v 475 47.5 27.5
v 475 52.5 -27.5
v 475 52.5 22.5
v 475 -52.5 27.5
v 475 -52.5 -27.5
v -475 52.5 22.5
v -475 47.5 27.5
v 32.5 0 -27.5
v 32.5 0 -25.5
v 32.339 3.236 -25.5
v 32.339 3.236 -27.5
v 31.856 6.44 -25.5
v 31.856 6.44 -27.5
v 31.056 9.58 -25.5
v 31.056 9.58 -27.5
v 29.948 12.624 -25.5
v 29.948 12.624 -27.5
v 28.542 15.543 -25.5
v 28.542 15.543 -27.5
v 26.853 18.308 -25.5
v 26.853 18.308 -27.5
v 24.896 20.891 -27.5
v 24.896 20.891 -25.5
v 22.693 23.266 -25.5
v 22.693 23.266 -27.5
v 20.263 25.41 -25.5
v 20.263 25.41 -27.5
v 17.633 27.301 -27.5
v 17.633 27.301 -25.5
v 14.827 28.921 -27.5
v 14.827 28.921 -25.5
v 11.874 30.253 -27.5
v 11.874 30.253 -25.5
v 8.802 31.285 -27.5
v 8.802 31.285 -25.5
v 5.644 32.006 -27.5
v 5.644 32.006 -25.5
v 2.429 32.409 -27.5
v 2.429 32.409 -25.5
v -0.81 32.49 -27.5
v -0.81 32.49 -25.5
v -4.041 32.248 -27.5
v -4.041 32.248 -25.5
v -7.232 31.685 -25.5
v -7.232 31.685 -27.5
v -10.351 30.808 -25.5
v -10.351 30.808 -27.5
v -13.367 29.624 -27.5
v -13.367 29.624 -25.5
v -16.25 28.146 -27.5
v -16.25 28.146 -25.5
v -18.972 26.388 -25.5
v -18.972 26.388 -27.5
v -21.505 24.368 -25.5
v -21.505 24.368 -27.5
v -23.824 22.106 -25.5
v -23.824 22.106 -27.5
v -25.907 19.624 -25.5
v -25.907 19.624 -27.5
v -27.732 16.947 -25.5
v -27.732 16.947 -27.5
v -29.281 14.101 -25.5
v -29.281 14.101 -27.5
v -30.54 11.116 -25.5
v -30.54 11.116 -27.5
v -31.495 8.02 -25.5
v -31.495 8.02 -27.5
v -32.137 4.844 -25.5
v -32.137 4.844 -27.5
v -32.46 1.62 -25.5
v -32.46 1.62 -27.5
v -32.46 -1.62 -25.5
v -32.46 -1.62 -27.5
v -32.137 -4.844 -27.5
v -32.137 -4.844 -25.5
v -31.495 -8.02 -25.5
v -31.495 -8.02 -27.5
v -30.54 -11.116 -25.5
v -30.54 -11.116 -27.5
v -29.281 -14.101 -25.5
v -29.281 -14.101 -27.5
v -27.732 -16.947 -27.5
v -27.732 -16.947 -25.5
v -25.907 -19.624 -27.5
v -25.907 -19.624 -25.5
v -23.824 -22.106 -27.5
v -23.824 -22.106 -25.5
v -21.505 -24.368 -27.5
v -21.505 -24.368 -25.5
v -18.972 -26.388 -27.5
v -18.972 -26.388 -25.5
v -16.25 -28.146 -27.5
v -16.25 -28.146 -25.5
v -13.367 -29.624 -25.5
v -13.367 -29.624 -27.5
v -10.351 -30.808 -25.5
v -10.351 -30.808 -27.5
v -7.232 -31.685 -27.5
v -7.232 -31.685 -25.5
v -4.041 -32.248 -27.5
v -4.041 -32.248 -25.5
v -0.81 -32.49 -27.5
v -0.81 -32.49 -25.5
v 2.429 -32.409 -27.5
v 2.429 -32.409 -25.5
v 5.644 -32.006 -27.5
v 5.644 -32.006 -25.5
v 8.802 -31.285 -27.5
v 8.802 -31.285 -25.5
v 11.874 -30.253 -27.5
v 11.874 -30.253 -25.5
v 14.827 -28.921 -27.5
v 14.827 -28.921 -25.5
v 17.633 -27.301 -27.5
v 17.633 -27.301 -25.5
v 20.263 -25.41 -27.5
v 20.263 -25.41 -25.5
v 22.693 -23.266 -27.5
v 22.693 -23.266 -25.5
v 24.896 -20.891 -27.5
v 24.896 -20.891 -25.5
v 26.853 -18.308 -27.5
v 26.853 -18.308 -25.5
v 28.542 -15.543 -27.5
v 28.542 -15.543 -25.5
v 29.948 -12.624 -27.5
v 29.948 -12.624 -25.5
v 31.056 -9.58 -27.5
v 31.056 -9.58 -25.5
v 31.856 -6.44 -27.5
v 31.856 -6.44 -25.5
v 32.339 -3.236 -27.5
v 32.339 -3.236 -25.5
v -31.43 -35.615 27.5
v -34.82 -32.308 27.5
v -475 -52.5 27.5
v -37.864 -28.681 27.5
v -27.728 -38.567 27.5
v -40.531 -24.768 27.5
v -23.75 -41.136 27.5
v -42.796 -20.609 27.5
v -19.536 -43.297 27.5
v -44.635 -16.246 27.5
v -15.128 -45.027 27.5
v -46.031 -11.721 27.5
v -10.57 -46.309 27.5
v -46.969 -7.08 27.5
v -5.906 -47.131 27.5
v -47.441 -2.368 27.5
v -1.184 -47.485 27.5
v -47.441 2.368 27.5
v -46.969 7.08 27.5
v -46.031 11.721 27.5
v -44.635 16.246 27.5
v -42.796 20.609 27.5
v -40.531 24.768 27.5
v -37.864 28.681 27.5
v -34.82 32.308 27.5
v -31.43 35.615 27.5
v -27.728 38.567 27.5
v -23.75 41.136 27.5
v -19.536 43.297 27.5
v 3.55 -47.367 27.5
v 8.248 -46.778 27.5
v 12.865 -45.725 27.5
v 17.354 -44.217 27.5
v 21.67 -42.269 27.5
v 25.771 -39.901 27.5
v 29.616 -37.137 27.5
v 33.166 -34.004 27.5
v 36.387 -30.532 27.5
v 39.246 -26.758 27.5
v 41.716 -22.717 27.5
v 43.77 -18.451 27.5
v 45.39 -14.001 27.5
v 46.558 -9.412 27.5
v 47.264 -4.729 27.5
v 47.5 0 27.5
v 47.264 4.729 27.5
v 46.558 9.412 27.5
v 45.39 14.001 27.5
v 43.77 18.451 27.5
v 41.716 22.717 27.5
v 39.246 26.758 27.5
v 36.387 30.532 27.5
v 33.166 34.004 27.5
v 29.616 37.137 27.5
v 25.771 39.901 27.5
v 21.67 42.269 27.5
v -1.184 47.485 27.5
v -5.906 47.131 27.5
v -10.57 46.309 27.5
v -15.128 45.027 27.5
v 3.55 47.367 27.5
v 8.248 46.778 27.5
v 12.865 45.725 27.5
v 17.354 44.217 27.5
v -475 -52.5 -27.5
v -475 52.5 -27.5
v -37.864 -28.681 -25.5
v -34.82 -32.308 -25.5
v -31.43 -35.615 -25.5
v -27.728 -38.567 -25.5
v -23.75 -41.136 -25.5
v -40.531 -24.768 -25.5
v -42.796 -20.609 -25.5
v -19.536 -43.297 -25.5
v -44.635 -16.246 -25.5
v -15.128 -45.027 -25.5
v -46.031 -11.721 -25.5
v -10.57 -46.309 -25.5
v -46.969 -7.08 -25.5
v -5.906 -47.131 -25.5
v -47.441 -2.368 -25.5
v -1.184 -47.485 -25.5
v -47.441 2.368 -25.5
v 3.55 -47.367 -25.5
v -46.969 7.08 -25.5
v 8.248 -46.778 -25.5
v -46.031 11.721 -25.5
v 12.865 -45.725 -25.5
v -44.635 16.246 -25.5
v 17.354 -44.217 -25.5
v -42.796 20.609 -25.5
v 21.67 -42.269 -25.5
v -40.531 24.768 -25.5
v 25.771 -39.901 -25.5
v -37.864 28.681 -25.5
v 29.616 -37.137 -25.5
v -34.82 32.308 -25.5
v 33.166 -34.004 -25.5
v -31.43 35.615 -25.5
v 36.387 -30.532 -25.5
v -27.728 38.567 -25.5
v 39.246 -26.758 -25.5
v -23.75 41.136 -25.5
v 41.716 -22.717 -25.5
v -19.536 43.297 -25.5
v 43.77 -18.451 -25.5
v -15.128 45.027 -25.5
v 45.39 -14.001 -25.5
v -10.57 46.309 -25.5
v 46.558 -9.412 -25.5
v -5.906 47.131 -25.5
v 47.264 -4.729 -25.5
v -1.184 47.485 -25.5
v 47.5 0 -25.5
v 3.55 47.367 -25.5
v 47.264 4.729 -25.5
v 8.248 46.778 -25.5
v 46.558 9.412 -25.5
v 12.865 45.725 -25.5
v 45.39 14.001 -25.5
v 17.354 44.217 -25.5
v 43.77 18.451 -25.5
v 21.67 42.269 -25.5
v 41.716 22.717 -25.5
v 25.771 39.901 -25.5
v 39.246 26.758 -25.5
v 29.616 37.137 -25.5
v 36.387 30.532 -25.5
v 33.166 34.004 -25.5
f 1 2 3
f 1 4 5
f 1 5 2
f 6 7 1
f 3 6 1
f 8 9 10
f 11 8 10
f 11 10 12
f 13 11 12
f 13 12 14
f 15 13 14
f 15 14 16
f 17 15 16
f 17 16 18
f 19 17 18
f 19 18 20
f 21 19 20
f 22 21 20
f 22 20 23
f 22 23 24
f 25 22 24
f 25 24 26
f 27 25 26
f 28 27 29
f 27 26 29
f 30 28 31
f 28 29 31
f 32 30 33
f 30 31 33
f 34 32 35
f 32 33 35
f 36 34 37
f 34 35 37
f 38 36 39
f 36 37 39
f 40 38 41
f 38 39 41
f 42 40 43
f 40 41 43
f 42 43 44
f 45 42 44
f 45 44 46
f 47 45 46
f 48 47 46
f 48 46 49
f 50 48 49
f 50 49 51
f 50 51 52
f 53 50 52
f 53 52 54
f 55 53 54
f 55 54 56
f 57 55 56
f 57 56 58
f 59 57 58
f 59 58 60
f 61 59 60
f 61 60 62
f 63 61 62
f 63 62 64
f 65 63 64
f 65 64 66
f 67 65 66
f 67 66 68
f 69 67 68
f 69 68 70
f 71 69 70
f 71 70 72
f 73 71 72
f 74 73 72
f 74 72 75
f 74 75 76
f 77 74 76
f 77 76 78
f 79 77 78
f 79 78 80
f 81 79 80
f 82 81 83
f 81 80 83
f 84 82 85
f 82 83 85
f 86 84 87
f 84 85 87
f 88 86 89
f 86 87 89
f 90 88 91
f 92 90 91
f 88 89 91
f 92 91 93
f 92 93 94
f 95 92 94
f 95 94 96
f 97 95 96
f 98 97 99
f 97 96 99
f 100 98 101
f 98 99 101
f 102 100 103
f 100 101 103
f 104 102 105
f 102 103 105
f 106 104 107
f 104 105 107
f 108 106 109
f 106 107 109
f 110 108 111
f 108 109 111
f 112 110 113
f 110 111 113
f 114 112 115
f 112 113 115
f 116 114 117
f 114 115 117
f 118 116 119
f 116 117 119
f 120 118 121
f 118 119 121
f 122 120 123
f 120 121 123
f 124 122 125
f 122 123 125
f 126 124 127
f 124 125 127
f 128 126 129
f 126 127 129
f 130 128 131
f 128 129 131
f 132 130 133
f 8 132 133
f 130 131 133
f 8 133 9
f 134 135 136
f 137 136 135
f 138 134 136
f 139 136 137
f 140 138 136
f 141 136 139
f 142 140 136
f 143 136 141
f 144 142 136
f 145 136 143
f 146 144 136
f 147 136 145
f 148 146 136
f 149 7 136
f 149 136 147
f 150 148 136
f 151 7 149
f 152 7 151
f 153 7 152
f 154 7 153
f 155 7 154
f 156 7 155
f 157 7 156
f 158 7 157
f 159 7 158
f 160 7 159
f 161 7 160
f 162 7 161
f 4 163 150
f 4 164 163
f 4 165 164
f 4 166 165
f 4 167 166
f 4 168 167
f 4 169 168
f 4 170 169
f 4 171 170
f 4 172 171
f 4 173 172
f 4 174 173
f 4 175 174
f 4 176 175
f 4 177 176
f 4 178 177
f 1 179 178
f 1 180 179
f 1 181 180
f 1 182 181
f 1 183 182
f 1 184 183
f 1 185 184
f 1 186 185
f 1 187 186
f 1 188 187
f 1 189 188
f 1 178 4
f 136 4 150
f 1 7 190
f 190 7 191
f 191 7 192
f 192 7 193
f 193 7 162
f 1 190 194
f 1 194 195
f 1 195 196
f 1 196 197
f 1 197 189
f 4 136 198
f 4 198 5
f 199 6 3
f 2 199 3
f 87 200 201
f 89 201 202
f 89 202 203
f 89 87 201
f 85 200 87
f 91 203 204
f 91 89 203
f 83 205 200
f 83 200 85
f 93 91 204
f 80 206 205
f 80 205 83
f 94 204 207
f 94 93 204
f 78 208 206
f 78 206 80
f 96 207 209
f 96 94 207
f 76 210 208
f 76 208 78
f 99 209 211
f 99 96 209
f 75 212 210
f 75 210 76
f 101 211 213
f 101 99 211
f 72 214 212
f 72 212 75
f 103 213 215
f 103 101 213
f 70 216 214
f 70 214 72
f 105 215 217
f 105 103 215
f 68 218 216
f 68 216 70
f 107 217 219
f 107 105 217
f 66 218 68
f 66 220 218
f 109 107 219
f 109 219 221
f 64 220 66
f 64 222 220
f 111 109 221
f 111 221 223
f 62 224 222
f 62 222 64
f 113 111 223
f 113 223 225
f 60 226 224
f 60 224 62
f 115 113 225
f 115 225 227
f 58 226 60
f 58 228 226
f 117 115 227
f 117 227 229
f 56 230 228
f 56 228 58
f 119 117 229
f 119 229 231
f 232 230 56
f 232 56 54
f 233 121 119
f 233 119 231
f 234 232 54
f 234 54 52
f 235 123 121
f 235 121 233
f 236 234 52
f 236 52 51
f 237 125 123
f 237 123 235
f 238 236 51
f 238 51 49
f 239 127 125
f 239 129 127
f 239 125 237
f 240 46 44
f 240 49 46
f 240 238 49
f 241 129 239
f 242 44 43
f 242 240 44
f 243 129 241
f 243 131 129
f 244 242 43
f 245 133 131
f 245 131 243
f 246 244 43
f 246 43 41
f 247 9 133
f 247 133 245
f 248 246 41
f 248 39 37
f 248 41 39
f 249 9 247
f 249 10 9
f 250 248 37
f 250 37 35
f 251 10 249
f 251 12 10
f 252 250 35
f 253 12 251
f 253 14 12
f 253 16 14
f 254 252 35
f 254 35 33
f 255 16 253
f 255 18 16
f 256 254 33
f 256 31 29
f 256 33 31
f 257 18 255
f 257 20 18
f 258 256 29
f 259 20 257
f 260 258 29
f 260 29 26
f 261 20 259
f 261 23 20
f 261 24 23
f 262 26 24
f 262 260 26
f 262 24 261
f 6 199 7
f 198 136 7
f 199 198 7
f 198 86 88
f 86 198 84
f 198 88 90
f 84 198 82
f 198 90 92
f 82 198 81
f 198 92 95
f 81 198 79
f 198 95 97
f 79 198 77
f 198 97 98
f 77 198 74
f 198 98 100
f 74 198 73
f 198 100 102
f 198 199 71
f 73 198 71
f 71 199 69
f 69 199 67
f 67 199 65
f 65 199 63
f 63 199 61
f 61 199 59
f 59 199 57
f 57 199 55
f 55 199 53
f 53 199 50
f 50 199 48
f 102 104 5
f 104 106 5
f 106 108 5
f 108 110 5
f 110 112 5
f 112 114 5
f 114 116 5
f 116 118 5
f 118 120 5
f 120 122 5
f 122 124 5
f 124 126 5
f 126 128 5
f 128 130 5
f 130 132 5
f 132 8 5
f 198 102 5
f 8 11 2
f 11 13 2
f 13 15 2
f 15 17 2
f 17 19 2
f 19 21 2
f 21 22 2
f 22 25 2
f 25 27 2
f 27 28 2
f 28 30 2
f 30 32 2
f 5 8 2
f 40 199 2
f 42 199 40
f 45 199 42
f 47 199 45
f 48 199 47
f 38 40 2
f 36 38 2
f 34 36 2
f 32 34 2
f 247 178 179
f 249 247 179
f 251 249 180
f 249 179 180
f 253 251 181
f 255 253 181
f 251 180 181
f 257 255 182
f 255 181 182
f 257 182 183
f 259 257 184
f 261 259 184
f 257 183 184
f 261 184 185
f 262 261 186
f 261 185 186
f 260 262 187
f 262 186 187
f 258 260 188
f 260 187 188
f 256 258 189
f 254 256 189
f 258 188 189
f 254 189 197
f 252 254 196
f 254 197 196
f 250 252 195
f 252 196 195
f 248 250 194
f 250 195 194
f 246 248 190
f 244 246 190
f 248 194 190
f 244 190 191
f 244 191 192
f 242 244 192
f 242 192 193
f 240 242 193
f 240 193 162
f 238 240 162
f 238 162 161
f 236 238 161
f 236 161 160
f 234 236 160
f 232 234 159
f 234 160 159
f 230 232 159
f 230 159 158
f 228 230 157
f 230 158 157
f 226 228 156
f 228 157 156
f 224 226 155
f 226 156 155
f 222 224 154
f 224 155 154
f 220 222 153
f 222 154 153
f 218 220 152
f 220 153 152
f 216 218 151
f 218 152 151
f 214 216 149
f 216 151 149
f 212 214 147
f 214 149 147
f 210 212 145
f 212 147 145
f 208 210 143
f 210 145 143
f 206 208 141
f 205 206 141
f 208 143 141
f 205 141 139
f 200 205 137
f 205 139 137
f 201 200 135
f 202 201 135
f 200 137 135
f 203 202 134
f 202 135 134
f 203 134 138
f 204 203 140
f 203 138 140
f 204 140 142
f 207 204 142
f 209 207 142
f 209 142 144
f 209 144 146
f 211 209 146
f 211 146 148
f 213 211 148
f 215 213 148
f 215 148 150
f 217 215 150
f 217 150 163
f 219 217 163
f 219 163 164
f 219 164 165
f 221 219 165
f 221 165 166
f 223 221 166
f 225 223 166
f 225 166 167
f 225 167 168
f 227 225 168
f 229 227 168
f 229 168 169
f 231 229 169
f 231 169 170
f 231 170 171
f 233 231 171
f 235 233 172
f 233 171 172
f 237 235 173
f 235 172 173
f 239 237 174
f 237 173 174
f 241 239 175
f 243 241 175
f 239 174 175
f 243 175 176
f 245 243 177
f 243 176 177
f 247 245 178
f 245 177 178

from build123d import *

# Parameters (mm, degrees)
SKETCH1_W           = 950
SKETCH1_H           = 105
BOSS_EXTRUDE1_DEPTH = 27.5
SKETCH2_R           = 47.5
CUT_EXTRUDE1_DEPTH  = 53
SKETCH3_R           = 32.5
CUT_EXTRUDE2_DEPTH  = 481.822472437
CHAMFER1_SIZE       = 5


with BuildPart() as part:
    # Sketch1 → Boss-Extrude1 (new, symmetric)
    with BuildSketch(Plane.XY):
        Rectangle(SKETCH1_W, SKETCH1_H)
    extrude(amount=BOSS_EXTRUDE1_DEPTH, both=True)

    # Sketch2 → Cut-Extrude1 (cut)
    with BuildSketch(Plane.XY.offset(27.5)):
        Circle(SKETCH2_R)
    extrude(amount=-CUT_EXTRUDE1_DEPTH, mode=Mode.SUBTRACT)

    # Sketch3 → Cut-Extrude2 (cut, through all)
    with BuildSketch(Plane.XY.offset(-25.5)):
        Circle(SKETCH3_R)
    extrude(amount=-CUT_EXTRUDE2_DEPTH, mode=Mode.SUBTRACT)

    # Chamfer1
    chamfer1_edges = [part.edges().sort_by_distance(p)[0] for p in [
        (0, 52.5, 27.5),
    ]]
    chamfer(chamfer1_edges, length=CHAMFER1_SIZE - 0.0001)  # a hair under: the kernel refuses the full size


solid = part.part
